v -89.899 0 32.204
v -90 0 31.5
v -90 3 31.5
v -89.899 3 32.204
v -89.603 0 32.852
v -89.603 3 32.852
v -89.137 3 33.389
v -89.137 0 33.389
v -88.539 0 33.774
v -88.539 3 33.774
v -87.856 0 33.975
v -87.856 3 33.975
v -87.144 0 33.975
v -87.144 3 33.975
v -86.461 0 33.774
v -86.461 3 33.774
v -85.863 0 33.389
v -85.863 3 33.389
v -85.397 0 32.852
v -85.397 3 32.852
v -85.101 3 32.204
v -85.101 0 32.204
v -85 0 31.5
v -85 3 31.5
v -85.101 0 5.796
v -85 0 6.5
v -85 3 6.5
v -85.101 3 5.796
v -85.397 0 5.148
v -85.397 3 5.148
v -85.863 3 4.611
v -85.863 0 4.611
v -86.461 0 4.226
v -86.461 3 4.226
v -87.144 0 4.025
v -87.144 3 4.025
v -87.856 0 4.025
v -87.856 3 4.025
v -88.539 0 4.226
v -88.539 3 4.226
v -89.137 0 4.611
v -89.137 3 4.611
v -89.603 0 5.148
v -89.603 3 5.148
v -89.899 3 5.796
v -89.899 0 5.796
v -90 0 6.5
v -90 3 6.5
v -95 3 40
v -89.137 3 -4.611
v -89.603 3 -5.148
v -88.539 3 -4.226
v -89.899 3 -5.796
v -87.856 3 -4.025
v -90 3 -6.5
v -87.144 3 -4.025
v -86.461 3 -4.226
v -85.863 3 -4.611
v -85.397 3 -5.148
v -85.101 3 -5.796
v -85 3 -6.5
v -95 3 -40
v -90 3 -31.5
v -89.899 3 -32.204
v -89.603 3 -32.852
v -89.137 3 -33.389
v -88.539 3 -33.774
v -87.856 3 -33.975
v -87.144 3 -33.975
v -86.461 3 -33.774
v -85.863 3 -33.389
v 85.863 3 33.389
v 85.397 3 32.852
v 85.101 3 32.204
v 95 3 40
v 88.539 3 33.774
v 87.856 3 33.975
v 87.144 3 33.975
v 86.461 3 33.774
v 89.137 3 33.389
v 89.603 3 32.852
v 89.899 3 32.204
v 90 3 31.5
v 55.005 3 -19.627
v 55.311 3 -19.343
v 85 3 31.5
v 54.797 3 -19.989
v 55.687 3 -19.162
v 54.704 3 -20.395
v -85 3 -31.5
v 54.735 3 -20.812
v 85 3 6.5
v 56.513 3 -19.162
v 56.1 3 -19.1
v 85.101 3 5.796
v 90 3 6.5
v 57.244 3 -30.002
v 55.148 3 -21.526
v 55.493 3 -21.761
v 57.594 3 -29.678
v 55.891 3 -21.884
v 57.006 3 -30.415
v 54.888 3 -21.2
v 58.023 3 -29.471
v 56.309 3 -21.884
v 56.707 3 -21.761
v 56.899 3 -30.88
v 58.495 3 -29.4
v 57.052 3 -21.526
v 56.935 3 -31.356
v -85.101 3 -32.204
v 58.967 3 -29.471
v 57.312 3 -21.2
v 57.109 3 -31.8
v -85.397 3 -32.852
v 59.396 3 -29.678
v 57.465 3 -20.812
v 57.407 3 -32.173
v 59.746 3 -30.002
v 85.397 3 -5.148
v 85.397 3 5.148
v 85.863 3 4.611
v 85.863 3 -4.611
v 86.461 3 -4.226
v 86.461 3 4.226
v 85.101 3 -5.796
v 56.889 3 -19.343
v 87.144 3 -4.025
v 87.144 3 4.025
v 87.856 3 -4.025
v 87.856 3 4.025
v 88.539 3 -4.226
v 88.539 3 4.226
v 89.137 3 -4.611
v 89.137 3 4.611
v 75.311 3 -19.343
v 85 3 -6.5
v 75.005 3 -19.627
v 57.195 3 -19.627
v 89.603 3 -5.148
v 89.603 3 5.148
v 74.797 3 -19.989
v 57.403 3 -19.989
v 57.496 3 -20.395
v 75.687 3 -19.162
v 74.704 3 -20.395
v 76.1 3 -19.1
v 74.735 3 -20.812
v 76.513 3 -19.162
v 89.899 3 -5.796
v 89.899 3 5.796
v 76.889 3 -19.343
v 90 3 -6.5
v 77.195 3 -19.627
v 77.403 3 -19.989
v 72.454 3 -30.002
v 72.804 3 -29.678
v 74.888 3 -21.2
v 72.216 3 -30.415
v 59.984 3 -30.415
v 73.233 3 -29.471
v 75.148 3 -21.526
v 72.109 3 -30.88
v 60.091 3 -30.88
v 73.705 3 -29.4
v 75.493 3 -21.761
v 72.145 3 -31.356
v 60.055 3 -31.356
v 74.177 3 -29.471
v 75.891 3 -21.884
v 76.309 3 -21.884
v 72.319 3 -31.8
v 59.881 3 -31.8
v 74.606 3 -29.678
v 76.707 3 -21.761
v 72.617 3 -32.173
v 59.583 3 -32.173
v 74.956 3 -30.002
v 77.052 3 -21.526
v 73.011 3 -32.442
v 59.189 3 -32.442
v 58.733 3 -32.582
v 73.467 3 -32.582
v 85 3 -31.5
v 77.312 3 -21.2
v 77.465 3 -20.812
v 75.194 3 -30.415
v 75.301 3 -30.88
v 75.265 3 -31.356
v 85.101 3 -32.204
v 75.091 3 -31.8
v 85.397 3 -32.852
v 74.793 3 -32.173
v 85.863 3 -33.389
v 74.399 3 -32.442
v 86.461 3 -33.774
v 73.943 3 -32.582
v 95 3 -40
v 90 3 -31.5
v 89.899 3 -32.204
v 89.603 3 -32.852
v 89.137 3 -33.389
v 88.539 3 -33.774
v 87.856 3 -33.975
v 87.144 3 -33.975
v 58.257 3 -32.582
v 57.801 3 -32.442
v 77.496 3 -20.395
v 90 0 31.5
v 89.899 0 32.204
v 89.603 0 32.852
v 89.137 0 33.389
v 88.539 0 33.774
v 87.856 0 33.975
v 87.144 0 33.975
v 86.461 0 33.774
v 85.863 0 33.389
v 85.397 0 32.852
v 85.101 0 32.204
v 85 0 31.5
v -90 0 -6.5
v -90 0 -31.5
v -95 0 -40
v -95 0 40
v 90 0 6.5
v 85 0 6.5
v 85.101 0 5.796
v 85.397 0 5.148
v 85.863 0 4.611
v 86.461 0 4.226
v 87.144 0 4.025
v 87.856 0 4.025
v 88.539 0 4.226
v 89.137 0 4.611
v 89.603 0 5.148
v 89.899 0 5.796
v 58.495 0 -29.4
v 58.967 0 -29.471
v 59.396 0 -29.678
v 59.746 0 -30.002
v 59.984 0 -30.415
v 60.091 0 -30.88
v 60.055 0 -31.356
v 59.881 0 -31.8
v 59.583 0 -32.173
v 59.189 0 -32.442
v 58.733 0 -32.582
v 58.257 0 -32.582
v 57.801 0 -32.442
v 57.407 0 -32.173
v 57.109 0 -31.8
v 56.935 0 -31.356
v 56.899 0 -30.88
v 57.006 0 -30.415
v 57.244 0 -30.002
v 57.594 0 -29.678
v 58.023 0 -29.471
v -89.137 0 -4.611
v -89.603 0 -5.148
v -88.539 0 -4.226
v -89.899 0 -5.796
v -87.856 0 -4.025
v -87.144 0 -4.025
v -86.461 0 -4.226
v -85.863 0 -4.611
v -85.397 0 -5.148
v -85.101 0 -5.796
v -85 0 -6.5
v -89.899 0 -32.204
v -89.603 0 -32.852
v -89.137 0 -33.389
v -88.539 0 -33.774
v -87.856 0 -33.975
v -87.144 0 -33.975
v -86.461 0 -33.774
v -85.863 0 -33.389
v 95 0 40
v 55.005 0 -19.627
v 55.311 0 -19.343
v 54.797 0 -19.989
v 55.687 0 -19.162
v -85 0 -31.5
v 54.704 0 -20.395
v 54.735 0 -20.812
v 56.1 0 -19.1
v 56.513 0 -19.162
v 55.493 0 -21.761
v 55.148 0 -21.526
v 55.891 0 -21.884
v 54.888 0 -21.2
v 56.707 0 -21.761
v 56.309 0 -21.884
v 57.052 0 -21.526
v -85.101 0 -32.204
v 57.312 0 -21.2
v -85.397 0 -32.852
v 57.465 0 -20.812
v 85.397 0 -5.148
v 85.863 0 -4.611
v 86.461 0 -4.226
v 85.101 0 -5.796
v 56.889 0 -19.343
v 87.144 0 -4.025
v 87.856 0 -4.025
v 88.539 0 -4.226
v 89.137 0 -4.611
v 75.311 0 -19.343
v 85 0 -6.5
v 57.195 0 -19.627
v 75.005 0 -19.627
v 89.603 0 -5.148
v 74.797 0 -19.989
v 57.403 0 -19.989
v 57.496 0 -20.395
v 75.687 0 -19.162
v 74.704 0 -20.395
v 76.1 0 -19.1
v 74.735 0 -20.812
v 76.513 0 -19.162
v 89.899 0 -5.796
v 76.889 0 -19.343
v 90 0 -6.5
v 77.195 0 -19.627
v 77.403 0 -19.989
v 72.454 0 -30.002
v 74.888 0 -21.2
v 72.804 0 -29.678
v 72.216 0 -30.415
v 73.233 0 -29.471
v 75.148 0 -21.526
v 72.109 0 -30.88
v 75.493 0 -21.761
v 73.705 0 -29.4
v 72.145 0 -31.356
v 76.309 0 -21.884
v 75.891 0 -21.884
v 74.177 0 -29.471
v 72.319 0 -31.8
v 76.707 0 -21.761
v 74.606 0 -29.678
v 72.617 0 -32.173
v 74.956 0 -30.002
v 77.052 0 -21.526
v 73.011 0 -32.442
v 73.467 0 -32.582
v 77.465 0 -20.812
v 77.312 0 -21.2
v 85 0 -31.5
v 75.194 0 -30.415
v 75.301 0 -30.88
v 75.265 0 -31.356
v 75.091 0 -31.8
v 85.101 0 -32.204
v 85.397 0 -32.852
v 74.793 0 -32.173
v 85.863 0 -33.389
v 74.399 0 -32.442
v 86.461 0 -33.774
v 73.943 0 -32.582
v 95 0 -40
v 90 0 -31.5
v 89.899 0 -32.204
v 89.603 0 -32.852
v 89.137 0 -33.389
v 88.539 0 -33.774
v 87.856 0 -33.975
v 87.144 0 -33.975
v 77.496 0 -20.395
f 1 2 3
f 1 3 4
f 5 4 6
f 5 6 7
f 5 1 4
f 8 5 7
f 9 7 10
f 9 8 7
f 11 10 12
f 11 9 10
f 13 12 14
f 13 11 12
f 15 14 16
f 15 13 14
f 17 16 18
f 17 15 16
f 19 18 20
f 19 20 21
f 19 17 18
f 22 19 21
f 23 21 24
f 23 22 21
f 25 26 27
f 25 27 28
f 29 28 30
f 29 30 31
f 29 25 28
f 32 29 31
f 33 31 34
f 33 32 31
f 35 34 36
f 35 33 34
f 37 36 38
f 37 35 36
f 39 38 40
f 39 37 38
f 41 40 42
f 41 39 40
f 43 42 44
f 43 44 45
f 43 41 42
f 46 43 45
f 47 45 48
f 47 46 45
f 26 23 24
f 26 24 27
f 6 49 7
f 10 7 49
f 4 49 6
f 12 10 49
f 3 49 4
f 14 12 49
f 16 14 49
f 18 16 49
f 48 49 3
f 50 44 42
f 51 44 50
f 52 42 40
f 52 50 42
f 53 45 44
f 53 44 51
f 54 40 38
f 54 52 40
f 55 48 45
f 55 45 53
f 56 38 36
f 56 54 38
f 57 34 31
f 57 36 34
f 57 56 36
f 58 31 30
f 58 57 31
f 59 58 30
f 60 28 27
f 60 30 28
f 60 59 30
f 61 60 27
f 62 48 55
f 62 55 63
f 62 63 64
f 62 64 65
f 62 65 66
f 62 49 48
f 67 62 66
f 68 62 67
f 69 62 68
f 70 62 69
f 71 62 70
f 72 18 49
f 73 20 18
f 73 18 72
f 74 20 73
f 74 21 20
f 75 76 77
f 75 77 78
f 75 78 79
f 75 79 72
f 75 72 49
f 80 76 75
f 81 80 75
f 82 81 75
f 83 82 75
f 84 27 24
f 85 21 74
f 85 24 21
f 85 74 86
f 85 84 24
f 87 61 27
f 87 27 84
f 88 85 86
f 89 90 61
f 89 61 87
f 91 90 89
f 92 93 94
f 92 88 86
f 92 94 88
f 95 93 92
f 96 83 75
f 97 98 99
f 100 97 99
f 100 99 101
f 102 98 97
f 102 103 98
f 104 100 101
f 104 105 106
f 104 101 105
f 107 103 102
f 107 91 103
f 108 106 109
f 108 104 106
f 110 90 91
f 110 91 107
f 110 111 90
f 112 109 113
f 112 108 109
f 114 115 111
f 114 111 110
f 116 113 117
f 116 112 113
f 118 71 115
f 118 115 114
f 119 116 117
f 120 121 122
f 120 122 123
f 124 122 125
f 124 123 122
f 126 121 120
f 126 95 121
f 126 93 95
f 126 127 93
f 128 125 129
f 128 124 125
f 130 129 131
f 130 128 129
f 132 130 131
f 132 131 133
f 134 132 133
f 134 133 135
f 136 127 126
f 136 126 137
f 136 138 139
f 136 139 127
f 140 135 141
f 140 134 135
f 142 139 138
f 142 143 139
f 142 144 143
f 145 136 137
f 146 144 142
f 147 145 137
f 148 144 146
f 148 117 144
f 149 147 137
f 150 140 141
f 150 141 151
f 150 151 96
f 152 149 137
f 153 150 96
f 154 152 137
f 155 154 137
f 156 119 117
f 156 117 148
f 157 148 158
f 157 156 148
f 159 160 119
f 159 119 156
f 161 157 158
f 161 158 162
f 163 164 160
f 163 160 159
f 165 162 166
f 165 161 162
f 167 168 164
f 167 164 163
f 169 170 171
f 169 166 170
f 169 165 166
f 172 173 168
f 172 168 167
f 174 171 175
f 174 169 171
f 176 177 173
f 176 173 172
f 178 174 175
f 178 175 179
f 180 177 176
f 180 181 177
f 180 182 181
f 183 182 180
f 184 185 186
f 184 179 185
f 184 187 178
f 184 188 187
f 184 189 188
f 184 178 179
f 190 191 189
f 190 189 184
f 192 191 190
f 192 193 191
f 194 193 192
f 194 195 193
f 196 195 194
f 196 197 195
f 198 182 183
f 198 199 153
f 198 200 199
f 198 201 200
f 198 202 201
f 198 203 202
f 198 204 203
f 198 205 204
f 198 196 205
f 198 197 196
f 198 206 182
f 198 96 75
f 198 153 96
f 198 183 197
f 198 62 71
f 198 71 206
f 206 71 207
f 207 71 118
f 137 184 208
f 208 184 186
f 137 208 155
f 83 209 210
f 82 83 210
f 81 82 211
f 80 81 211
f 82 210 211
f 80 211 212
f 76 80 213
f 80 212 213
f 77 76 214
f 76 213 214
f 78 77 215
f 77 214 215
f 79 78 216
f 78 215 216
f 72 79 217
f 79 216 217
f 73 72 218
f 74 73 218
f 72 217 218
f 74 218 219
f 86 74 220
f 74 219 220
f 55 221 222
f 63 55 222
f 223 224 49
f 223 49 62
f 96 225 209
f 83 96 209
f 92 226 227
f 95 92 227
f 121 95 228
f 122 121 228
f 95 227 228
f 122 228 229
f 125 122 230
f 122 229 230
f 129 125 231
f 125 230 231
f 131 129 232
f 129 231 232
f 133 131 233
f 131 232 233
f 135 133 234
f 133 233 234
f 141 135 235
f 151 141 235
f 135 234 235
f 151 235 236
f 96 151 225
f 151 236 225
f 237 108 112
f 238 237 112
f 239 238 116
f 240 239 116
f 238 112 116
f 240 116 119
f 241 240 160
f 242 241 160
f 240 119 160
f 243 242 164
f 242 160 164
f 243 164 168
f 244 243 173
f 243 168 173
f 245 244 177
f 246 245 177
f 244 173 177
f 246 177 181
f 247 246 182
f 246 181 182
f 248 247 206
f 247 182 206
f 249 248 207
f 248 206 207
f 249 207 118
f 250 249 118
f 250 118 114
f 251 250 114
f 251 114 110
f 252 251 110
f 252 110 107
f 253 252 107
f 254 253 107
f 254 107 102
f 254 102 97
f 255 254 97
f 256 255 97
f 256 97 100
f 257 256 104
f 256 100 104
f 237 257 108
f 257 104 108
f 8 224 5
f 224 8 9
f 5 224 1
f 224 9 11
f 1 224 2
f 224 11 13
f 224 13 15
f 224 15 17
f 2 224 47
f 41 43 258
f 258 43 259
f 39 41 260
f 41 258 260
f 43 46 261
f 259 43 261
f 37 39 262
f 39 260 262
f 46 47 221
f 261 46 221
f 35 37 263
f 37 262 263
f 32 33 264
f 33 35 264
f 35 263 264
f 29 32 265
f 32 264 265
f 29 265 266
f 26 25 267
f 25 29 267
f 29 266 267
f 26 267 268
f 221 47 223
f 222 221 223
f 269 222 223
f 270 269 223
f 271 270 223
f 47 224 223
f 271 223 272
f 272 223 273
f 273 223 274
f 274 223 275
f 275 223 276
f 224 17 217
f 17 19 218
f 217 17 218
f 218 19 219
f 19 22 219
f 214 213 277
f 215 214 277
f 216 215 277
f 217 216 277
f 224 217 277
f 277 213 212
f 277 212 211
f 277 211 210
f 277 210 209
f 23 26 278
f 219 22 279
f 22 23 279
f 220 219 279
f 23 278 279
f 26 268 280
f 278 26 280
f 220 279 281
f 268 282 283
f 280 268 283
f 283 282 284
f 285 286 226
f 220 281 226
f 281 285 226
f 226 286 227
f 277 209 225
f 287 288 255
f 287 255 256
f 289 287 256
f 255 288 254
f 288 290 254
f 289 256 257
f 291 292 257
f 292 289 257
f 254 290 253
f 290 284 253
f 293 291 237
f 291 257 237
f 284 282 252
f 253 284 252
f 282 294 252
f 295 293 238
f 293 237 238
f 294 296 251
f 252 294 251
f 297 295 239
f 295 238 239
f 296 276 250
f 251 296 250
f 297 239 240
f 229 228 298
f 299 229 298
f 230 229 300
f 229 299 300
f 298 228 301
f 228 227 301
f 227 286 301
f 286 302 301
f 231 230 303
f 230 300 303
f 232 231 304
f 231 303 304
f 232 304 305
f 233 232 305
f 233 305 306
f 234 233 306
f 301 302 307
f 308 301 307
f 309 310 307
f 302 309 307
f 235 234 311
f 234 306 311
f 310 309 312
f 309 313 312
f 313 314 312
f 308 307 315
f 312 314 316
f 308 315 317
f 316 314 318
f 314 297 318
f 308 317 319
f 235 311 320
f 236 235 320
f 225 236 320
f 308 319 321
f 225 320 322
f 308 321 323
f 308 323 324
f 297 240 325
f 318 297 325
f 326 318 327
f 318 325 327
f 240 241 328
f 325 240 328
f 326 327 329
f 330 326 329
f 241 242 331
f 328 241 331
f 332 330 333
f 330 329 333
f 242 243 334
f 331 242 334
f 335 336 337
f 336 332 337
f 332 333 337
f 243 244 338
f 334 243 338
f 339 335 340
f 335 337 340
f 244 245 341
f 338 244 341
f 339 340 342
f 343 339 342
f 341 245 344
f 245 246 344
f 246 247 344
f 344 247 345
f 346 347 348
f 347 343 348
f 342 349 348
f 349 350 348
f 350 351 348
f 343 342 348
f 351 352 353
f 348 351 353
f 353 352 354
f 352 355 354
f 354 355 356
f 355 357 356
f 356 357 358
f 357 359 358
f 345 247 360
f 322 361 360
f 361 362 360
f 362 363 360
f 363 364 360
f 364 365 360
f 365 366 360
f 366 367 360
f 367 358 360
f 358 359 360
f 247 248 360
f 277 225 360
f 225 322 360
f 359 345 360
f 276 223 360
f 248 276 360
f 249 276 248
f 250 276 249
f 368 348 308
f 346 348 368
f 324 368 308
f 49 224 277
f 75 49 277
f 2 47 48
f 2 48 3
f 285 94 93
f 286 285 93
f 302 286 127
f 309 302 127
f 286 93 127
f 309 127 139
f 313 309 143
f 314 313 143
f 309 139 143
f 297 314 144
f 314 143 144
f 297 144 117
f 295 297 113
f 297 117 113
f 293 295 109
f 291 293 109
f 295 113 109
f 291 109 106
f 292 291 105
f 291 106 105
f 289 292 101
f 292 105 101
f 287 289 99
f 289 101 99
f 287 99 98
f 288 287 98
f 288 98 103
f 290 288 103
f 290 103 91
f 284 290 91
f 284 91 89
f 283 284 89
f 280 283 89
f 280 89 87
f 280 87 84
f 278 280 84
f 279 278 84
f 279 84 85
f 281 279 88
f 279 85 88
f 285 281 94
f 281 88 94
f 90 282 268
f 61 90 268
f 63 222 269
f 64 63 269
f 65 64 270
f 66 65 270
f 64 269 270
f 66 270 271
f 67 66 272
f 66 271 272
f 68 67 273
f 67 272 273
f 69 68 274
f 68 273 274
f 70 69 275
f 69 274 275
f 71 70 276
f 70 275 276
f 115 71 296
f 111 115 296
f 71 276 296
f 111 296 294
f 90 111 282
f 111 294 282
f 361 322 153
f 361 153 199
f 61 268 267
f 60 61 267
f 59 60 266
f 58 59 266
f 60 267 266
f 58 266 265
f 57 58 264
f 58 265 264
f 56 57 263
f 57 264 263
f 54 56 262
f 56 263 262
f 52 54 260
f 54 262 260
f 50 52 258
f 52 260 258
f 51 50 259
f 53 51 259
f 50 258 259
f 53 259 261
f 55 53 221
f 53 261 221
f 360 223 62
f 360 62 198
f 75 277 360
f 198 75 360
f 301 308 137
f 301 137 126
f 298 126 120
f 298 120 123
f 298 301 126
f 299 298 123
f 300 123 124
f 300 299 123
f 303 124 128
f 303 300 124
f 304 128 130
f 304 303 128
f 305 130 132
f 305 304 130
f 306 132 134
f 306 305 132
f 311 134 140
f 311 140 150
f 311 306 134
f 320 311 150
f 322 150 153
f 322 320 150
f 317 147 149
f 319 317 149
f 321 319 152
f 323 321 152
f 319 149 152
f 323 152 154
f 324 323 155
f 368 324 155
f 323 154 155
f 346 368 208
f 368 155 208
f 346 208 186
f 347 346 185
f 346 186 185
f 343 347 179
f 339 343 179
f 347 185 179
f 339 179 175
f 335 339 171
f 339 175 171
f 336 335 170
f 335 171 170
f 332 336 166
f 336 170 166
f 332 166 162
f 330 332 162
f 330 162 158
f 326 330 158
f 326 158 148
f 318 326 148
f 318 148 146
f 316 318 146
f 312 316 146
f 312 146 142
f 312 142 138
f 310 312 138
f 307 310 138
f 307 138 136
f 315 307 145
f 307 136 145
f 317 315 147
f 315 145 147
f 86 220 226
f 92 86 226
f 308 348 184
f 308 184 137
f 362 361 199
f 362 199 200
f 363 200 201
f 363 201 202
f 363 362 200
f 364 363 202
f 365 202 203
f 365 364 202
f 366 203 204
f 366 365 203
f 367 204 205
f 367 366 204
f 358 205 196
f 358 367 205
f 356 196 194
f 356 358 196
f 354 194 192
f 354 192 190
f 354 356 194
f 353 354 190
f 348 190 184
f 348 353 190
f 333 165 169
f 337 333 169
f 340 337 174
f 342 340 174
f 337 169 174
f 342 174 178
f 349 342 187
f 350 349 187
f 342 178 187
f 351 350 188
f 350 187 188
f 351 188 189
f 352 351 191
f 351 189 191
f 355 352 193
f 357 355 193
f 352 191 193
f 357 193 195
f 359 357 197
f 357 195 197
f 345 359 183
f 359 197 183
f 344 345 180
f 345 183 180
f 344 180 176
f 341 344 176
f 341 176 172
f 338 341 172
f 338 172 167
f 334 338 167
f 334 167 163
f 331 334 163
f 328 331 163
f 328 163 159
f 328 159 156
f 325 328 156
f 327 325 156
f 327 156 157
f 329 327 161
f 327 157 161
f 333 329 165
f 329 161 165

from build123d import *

# Parameters (mm, degrees)
SKETCH1_W           = 190
SKETCH1_H           = 80
BOSS_EXTRUDE1_DEPTH = 3
SKETCH4_R           = 1.4
SKETCH4_R_2         = 1.6
CUT_EXTRUDE2_DEPTH  = 3


with BuildPart() as part:
    # Sketch1 → Boss-Extrude1 (new body)
    with BuildSketch(Plane(origin=(0, 0, 0), x_dir=(1, 0, 0), z_dir=(0, 1, 0))):
        Rectangle(SKETCH1_W, SKETCH1_H)
        with BuildLine():
            Line((-90, 6.5), (-90, 31.5))
            ThreePointArc((-90, 31.5), (-87.5, 34), (-85, 31.5))
            Line((-85, 31.5), (-85, 6.5))
            ThreePointArc((-85, 6.5), (-87.5, 4), (-90, 6.5))
        make_face(mode=Mode.SUBTRACT)
        with BuildLine():
            Line((-90, -6.5), (-90, -31.5))
            ThreePointArc((-90, -31.5), (-87.5, -34), (-85, -31.5))
            Line((-85, -31.5), (-85, -6.5))
            ThreePointArc((-85, -6.5), (-87.5, -4), (-90, -6.5))
        make_face(mode=Mode.SUBTRACT)
        with BuildLine():
            Line((90, 6.5), (90, 31.5))
            ThreePointArc((90, 31.5), (87.5, 34), (85, 31.5))
            Line((85, 31.5), (85, 6.5))
            ThreePointArc((85, 6.5), (87.5, 4), (90, 6.5))
        make_face(mode=Mode.SUBTRACT)
        with BuildLine():
            Line((90, -6.5), (90, -31.5))
            ThreePointArc((90, -31.5), (87.5, -34), (85, -31.5))
            Line((85, -31.5), (85, -6.5))
            ThreePointArc((85, -6.5), (87.5, -4), (90, -6.5))
        make_face(mode=Mode.SUBTRACT)
    extrude(amount=BOSS_EXTRUDE1_DEPTH)

    # Sketch4 → Cut-Extrude2 (cut)
    with BuildSketch(Plane(origin=(0, 3, 0), x_dir=(1, 0, 0), z_dir=(0, 1, 0))):
        with Locations(Location((56.1, 20.5, 0), (0, 0, 270))):
            Circle(SKETCH4_R)
        with Locations(Location((76.1, 20.5, 0), (0, 0, 270))):
            Circle(SKETCH4_R)
        with Locations(Location((58.495, 31, 0), (0, 0, 270))):
            Circle(SKETCH4_R_2)
        with Locations(Location((73.705, 31, 0), (0, 0, 270))):
            Circle(SKETCH4_R_2)
    extrude(amount=-CUT_EXTRUDE2_DEPTH, mode=Mode.SUBTRACT)


solid = part.part
